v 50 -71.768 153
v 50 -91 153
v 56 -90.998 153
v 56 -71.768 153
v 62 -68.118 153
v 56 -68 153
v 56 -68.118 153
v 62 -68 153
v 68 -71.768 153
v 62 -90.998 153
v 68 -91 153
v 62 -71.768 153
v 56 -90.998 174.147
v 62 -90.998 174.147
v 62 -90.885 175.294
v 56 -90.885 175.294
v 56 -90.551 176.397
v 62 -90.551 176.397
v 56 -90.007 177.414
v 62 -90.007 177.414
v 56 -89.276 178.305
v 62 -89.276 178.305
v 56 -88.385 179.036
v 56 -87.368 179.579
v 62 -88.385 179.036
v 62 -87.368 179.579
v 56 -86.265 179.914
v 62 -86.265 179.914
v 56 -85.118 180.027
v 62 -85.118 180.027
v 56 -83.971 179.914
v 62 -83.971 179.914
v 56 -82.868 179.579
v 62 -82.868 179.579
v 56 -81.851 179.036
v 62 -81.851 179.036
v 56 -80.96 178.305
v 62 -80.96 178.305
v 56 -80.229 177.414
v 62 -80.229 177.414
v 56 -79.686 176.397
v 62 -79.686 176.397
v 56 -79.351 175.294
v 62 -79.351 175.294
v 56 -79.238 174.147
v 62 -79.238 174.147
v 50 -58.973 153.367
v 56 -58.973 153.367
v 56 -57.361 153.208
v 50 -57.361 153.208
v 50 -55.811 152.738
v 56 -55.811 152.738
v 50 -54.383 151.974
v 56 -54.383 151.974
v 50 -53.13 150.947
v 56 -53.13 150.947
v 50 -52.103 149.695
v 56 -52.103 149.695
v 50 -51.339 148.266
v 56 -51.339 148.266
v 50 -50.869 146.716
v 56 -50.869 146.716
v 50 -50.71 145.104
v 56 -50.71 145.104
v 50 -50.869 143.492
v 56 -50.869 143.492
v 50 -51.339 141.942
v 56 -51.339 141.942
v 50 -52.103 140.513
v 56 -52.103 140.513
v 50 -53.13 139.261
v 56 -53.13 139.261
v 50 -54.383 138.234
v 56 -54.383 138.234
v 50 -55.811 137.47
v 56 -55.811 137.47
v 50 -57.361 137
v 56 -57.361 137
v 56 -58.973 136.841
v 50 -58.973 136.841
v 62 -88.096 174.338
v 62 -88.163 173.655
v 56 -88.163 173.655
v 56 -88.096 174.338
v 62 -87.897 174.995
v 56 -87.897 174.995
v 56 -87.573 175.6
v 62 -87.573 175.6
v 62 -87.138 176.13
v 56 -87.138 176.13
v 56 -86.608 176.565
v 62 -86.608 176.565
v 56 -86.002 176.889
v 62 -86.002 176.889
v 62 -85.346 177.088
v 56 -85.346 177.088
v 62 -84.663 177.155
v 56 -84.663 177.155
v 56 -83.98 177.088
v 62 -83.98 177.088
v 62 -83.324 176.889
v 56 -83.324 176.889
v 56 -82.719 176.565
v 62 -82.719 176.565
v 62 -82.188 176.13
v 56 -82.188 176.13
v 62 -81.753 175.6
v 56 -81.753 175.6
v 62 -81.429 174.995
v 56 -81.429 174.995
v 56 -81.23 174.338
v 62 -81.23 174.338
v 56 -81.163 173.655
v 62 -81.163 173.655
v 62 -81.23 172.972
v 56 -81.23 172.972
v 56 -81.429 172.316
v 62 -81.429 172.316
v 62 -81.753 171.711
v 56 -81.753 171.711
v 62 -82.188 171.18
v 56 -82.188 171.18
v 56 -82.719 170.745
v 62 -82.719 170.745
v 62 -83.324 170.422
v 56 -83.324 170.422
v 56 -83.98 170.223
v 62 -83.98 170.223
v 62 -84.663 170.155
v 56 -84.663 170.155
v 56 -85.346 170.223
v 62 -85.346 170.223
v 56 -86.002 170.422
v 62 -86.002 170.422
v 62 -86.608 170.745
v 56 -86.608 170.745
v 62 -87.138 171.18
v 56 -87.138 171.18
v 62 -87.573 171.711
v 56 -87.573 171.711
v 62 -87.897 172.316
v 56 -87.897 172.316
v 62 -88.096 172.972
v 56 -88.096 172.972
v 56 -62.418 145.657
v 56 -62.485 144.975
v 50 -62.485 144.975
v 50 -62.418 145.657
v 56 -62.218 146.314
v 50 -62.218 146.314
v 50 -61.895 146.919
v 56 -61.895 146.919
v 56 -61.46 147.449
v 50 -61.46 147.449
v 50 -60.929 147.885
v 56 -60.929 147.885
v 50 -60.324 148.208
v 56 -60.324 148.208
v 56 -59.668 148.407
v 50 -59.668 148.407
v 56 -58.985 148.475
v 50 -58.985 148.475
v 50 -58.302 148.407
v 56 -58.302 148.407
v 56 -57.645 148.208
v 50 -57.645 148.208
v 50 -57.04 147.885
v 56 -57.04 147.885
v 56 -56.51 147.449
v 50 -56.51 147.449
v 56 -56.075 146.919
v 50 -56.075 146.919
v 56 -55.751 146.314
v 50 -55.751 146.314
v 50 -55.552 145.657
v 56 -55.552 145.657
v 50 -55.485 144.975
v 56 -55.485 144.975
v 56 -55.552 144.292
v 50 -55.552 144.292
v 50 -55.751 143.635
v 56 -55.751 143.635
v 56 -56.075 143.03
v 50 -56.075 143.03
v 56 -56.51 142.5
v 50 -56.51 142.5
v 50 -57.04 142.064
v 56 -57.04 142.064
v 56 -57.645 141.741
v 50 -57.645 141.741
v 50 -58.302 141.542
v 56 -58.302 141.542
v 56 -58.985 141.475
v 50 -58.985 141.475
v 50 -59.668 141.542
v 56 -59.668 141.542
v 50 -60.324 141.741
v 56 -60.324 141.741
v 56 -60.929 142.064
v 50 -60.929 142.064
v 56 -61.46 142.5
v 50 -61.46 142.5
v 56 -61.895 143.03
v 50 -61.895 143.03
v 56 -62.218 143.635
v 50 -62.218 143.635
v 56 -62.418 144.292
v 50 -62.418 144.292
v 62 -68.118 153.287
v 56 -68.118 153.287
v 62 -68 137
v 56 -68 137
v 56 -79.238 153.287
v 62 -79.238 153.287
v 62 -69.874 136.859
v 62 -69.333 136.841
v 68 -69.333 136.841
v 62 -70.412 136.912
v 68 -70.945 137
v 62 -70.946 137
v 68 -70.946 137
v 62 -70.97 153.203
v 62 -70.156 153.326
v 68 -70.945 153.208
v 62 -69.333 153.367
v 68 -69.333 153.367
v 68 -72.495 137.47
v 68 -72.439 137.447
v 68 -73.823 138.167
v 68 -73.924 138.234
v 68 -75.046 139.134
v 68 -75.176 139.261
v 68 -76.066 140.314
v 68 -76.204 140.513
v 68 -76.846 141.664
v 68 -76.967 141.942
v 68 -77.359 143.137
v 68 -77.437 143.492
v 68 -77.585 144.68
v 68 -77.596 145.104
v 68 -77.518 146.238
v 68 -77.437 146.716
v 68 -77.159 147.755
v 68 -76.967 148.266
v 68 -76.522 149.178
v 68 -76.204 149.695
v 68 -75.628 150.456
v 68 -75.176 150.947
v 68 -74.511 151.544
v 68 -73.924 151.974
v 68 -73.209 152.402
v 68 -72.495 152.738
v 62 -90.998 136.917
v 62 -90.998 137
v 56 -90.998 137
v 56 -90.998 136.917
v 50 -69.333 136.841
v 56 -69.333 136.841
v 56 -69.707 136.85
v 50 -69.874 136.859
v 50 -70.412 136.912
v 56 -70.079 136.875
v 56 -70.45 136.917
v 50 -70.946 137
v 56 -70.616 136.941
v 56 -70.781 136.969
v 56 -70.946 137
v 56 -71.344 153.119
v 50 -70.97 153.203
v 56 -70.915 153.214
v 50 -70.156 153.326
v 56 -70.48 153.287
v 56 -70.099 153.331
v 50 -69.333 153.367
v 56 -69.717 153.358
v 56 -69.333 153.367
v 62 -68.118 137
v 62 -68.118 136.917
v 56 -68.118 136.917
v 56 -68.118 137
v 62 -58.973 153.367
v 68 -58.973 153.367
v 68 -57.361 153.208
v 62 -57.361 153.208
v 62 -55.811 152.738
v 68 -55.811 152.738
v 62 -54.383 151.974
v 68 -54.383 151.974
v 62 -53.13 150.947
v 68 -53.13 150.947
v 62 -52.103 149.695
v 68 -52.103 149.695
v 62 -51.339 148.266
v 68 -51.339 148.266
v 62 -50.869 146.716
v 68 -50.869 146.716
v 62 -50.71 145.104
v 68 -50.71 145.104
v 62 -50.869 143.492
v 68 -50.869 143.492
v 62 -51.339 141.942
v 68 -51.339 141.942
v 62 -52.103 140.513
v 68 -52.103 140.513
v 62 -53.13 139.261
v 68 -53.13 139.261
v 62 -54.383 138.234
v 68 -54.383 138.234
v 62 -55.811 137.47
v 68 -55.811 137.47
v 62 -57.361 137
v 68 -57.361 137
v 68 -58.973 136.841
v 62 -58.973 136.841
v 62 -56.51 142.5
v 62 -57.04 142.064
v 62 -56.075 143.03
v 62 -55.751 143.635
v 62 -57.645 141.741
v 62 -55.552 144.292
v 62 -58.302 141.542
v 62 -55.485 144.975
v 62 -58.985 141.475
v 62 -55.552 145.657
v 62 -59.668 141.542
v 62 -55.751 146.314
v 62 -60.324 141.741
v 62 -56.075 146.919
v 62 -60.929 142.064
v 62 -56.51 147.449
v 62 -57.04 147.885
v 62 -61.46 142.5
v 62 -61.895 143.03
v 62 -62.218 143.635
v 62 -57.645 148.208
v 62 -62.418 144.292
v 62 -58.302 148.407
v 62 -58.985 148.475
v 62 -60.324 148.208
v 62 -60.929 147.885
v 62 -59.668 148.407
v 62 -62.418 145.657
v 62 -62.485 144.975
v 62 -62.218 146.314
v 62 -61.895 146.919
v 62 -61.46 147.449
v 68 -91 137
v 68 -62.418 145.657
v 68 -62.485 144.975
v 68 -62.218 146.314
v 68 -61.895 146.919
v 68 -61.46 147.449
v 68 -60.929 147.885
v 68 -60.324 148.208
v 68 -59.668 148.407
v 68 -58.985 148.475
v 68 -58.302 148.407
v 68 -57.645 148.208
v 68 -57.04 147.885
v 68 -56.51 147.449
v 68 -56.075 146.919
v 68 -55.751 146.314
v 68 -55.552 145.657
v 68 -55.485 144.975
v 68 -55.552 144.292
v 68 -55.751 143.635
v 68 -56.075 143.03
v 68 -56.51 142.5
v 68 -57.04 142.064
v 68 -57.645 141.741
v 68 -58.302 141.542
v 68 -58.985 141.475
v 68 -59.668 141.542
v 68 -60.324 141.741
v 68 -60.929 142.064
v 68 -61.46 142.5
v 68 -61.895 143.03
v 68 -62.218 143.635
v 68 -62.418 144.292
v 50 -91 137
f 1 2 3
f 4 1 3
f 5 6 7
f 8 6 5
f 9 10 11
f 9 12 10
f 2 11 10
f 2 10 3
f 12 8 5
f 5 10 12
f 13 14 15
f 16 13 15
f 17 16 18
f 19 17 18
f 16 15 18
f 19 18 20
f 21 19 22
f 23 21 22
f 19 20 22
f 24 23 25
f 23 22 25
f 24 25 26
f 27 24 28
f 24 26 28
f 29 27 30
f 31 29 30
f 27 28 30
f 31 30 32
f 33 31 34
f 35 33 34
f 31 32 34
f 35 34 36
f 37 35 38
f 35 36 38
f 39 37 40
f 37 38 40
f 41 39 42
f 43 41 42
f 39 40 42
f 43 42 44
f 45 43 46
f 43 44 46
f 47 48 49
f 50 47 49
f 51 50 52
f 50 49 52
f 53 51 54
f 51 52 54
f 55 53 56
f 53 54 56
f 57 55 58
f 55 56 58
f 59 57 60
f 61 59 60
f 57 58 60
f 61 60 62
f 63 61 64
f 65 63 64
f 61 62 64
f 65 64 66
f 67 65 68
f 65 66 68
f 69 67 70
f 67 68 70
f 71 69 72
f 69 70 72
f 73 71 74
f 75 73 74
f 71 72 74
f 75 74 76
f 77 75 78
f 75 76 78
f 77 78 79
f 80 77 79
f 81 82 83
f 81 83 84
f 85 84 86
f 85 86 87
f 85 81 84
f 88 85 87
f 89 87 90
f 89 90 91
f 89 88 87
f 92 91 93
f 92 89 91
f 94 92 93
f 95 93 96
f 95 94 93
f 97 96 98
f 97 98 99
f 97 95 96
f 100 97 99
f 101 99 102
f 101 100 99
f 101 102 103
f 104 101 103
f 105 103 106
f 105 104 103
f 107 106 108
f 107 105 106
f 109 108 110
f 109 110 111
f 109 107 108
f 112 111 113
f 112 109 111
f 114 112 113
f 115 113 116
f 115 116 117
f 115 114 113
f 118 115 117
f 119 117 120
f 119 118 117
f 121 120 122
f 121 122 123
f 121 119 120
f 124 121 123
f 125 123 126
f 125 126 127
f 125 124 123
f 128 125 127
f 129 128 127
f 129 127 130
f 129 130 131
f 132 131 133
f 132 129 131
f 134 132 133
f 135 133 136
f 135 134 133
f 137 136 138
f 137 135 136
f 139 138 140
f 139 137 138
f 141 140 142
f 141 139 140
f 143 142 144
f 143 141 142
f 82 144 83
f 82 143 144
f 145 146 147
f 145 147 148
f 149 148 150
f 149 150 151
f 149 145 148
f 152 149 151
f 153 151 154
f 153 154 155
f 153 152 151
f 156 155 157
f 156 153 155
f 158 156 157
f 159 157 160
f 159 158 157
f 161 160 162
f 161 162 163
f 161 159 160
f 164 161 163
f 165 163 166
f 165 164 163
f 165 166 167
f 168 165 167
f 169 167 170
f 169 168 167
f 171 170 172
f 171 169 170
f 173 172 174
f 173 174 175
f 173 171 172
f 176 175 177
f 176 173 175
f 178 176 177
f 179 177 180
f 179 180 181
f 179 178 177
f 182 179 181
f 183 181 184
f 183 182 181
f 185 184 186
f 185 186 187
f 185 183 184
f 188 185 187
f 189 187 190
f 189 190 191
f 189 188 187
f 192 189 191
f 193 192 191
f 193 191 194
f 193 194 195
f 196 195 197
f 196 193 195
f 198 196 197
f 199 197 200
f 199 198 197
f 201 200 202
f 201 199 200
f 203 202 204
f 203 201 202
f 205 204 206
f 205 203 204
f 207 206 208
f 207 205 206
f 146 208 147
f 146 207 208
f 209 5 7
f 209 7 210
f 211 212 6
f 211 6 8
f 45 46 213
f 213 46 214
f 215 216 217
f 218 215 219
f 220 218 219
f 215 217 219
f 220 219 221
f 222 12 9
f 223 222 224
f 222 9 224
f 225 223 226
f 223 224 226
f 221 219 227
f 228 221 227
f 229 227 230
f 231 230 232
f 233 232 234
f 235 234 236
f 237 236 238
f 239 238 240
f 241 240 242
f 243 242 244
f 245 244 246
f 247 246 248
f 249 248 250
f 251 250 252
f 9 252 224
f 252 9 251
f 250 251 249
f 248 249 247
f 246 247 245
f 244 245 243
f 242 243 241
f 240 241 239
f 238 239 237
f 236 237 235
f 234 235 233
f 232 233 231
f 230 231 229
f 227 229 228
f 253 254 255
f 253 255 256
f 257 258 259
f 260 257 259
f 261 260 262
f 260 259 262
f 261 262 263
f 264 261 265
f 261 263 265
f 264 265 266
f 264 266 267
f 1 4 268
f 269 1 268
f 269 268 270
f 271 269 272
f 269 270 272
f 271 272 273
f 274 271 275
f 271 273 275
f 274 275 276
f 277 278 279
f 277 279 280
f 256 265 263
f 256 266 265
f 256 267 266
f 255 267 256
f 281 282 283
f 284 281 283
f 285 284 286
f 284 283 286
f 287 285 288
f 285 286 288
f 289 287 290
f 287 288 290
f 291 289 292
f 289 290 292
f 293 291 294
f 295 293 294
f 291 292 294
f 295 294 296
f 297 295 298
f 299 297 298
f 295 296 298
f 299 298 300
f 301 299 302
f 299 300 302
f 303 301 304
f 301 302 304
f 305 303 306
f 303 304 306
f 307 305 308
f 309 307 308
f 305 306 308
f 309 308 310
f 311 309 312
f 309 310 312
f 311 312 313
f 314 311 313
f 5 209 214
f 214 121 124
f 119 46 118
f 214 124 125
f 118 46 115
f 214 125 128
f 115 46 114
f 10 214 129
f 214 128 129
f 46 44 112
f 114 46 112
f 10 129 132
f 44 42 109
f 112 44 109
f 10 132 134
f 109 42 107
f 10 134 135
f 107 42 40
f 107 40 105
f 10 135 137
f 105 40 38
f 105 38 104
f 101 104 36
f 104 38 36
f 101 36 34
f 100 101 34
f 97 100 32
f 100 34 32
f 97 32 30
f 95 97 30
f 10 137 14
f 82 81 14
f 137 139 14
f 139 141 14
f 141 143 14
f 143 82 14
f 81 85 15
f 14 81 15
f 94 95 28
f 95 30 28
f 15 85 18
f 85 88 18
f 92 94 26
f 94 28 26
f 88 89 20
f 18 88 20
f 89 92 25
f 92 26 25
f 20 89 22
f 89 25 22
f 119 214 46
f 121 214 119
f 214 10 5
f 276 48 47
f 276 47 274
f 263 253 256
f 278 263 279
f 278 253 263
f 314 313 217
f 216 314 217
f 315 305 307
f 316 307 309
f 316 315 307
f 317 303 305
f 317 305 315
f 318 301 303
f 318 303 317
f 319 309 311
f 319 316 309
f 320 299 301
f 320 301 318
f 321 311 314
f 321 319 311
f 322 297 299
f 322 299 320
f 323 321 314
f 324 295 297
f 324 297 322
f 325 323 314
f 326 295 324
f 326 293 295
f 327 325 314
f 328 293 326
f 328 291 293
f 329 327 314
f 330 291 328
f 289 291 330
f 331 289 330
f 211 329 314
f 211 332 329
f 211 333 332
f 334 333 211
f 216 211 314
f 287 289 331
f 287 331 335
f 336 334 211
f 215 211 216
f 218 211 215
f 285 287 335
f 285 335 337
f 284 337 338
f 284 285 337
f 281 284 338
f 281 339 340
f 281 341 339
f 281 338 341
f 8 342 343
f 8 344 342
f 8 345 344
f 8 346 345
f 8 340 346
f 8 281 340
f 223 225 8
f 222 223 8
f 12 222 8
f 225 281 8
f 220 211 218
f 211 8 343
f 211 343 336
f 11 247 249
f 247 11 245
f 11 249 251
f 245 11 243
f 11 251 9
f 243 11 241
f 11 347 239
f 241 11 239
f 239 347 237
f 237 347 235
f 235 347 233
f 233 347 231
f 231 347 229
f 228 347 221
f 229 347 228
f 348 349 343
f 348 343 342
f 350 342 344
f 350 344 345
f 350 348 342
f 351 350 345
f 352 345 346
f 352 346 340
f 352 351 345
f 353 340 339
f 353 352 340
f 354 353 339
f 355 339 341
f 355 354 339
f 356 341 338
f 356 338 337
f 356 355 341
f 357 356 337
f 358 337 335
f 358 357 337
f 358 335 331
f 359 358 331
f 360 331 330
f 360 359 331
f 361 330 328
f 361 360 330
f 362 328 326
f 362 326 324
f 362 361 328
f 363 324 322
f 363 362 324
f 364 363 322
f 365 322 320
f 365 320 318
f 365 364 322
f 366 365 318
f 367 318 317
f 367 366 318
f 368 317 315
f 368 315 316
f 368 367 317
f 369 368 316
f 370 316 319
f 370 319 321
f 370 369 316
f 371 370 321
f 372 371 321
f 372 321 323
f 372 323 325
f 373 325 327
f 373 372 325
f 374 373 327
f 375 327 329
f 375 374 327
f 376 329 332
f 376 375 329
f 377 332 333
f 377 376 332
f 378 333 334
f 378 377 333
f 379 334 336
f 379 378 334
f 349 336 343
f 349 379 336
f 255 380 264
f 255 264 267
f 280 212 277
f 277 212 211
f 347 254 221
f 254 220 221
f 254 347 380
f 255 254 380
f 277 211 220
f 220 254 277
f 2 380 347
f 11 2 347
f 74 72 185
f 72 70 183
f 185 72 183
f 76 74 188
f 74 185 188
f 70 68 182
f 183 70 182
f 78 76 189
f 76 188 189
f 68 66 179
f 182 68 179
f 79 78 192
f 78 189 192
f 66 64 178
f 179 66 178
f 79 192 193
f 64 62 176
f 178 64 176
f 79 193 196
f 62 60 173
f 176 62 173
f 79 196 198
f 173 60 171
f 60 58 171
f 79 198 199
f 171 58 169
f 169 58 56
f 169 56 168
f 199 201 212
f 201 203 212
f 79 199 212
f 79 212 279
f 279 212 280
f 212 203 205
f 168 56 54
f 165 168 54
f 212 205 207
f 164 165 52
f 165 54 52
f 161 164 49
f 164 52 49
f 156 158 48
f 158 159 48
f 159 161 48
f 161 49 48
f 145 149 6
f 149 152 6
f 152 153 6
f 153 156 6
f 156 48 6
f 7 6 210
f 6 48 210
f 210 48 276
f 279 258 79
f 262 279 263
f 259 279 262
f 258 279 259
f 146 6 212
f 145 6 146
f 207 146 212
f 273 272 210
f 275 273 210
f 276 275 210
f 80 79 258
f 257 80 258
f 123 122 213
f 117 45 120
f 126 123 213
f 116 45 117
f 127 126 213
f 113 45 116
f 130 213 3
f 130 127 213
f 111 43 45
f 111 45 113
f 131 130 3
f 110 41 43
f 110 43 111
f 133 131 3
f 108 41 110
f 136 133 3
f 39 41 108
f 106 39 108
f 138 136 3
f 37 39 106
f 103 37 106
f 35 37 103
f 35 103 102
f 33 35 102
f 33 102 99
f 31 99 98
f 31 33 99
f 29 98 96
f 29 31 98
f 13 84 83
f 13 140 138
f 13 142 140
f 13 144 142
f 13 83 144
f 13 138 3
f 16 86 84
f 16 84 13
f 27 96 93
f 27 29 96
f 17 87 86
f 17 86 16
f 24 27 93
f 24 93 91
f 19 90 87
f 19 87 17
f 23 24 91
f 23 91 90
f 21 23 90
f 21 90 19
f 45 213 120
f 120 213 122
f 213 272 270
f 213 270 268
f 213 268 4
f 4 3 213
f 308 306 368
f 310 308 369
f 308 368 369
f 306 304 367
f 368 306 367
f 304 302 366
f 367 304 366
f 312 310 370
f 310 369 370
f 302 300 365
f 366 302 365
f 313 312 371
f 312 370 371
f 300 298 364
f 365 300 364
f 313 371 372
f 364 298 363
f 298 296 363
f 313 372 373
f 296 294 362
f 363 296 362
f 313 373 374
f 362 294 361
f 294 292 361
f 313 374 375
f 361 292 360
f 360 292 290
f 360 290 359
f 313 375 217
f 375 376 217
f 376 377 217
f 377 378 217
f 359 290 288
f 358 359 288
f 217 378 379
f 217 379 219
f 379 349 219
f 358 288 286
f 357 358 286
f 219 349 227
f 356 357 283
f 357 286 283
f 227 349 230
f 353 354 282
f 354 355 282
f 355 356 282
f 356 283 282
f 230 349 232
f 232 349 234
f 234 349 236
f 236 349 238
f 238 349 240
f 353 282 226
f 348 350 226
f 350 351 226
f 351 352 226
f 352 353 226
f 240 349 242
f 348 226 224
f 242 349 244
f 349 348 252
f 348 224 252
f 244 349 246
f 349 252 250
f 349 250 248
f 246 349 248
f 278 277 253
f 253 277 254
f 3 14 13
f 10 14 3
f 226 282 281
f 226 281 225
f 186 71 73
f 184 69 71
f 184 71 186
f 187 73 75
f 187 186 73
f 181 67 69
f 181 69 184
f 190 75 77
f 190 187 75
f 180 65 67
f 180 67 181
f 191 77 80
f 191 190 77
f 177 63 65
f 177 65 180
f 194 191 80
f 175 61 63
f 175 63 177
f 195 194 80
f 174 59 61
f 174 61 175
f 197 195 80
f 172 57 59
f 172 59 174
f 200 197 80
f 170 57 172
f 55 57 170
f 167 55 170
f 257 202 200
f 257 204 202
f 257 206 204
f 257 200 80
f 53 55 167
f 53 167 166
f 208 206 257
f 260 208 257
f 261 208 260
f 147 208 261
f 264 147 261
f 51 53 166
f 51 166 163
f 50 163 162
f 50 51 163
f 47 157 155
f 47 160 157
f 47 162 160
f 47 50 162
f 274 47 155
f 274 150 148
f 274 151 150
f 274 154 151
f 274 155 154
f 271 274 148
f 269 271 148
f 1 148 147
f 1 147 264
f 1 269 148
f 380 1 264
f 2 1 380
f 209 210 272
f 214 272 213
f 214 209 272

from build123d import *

# Parameters (mm, degrees)
BOX_W            = 18
BOX_H            = 23
BOX_DEPTH        = 16
SKETCH052_R      = 3.5
EXTRUDE107_DEPTH = 6
SKETCH053_R      = 3.5
EXTRUDE108_DEPTH = 6


with BuildPart() as cuadrado:
    # Box → Box (new body)
    with BuildSketch(Plane(origin=(50, -91, 137), x_dir=(1, 0, 0), z_dir=(0, 0, 1))):
        with Locations((9, 11.5)):
            Rectangle(BOX_W, BOX_H)
    extrude(amount=BOX_DEPTH)


with BuildPart() as union_codo:
    # Sketch052 → Extrude107 (new body)
    with BuildSketch(Plane(origin=(0, 0, 0), x_dir=(0, -1, 0), z_dir=(-1, 0, 0))):
        with BuildLine():
            ThreePointArc((58.973241, 153.367004), (50.710325, 145.104089), (58.973241, 136.841174))
            Line((58.973241, 136.841174), (69.333241, 136.841174))
            ThreePointArc((69.333241, 136.841174), (77.596156, 145.104089), (69.333241, 153.367004))
            Line((58.973241, 153.367004), (69.333241, 153.367004))
        make_face()
        with Locations((58.984818, 144.974605)):
            Circle(SKETCH052_R, mode=Mode.SUBTRACT)
    extrude(amount=EXTRUDE107_DEPTH)


with BuildPart() as union_codo_1:
    # Extrude107 placement: moved
    add(union_codo.part.moved(Location((56, 0, 0))))


with BuildPart() as union_codo1:
    # Link027 base: copy of Union codo
    add(union_codo_1.part)


with BuildPart() as union_codo1_1:
    # Link027 placement: moved
    add(union_codo1.part.moved(Location((12.000008, -8e-06, 0))))


with BuildPart() as base_union_pinza:
    # Sketch053 → Extrude108 (new body)
    with BuildSketch(Plane(origin=(0, 0, 0), x_dir=(0, -1, 0), z_dir=(-1, 0, 0))):
        with BuildLine():
            ThreePointArc((90.998128, 174.147008), (85.118128, 180.027008), (79.238128, 174.147008))
            Line((79.238128, 174.147008), (79.238128, 153.287008))
            Line((68.118128, 153.287008), (79.238128, 153.287008))
            Line((68.118128, 136.917008), (68.118128, 153.287008))
            Line((90.998128, 136.917008), (68.118128, 136.917008))
            Line((90.998128, 153.287008), (90.998128, 136.917008))
            Line((90.998128, 174.147008), (90.998128, 153.287008))
        make_face()
        with Locations((84.66301, 173.655309)):
            Circle(SKETCH053_R, mode=Mode.SUBTRACT)
    extrude(amount=EXTRUDE108_DEPTH)


with BuildPart() as base_union_pinza_1:
    # Extrude108 placement: moved
    add(base_union_pinza.part.moved(Location((62, 0, 0))))

    # Fusion077: union Cuadrado, Union codo1, Union codo
    add(cuadrado.part)
    add(union_codo1_1.part)
    add(union_codo_1.part)


solid = base_union_pinza_1.part
